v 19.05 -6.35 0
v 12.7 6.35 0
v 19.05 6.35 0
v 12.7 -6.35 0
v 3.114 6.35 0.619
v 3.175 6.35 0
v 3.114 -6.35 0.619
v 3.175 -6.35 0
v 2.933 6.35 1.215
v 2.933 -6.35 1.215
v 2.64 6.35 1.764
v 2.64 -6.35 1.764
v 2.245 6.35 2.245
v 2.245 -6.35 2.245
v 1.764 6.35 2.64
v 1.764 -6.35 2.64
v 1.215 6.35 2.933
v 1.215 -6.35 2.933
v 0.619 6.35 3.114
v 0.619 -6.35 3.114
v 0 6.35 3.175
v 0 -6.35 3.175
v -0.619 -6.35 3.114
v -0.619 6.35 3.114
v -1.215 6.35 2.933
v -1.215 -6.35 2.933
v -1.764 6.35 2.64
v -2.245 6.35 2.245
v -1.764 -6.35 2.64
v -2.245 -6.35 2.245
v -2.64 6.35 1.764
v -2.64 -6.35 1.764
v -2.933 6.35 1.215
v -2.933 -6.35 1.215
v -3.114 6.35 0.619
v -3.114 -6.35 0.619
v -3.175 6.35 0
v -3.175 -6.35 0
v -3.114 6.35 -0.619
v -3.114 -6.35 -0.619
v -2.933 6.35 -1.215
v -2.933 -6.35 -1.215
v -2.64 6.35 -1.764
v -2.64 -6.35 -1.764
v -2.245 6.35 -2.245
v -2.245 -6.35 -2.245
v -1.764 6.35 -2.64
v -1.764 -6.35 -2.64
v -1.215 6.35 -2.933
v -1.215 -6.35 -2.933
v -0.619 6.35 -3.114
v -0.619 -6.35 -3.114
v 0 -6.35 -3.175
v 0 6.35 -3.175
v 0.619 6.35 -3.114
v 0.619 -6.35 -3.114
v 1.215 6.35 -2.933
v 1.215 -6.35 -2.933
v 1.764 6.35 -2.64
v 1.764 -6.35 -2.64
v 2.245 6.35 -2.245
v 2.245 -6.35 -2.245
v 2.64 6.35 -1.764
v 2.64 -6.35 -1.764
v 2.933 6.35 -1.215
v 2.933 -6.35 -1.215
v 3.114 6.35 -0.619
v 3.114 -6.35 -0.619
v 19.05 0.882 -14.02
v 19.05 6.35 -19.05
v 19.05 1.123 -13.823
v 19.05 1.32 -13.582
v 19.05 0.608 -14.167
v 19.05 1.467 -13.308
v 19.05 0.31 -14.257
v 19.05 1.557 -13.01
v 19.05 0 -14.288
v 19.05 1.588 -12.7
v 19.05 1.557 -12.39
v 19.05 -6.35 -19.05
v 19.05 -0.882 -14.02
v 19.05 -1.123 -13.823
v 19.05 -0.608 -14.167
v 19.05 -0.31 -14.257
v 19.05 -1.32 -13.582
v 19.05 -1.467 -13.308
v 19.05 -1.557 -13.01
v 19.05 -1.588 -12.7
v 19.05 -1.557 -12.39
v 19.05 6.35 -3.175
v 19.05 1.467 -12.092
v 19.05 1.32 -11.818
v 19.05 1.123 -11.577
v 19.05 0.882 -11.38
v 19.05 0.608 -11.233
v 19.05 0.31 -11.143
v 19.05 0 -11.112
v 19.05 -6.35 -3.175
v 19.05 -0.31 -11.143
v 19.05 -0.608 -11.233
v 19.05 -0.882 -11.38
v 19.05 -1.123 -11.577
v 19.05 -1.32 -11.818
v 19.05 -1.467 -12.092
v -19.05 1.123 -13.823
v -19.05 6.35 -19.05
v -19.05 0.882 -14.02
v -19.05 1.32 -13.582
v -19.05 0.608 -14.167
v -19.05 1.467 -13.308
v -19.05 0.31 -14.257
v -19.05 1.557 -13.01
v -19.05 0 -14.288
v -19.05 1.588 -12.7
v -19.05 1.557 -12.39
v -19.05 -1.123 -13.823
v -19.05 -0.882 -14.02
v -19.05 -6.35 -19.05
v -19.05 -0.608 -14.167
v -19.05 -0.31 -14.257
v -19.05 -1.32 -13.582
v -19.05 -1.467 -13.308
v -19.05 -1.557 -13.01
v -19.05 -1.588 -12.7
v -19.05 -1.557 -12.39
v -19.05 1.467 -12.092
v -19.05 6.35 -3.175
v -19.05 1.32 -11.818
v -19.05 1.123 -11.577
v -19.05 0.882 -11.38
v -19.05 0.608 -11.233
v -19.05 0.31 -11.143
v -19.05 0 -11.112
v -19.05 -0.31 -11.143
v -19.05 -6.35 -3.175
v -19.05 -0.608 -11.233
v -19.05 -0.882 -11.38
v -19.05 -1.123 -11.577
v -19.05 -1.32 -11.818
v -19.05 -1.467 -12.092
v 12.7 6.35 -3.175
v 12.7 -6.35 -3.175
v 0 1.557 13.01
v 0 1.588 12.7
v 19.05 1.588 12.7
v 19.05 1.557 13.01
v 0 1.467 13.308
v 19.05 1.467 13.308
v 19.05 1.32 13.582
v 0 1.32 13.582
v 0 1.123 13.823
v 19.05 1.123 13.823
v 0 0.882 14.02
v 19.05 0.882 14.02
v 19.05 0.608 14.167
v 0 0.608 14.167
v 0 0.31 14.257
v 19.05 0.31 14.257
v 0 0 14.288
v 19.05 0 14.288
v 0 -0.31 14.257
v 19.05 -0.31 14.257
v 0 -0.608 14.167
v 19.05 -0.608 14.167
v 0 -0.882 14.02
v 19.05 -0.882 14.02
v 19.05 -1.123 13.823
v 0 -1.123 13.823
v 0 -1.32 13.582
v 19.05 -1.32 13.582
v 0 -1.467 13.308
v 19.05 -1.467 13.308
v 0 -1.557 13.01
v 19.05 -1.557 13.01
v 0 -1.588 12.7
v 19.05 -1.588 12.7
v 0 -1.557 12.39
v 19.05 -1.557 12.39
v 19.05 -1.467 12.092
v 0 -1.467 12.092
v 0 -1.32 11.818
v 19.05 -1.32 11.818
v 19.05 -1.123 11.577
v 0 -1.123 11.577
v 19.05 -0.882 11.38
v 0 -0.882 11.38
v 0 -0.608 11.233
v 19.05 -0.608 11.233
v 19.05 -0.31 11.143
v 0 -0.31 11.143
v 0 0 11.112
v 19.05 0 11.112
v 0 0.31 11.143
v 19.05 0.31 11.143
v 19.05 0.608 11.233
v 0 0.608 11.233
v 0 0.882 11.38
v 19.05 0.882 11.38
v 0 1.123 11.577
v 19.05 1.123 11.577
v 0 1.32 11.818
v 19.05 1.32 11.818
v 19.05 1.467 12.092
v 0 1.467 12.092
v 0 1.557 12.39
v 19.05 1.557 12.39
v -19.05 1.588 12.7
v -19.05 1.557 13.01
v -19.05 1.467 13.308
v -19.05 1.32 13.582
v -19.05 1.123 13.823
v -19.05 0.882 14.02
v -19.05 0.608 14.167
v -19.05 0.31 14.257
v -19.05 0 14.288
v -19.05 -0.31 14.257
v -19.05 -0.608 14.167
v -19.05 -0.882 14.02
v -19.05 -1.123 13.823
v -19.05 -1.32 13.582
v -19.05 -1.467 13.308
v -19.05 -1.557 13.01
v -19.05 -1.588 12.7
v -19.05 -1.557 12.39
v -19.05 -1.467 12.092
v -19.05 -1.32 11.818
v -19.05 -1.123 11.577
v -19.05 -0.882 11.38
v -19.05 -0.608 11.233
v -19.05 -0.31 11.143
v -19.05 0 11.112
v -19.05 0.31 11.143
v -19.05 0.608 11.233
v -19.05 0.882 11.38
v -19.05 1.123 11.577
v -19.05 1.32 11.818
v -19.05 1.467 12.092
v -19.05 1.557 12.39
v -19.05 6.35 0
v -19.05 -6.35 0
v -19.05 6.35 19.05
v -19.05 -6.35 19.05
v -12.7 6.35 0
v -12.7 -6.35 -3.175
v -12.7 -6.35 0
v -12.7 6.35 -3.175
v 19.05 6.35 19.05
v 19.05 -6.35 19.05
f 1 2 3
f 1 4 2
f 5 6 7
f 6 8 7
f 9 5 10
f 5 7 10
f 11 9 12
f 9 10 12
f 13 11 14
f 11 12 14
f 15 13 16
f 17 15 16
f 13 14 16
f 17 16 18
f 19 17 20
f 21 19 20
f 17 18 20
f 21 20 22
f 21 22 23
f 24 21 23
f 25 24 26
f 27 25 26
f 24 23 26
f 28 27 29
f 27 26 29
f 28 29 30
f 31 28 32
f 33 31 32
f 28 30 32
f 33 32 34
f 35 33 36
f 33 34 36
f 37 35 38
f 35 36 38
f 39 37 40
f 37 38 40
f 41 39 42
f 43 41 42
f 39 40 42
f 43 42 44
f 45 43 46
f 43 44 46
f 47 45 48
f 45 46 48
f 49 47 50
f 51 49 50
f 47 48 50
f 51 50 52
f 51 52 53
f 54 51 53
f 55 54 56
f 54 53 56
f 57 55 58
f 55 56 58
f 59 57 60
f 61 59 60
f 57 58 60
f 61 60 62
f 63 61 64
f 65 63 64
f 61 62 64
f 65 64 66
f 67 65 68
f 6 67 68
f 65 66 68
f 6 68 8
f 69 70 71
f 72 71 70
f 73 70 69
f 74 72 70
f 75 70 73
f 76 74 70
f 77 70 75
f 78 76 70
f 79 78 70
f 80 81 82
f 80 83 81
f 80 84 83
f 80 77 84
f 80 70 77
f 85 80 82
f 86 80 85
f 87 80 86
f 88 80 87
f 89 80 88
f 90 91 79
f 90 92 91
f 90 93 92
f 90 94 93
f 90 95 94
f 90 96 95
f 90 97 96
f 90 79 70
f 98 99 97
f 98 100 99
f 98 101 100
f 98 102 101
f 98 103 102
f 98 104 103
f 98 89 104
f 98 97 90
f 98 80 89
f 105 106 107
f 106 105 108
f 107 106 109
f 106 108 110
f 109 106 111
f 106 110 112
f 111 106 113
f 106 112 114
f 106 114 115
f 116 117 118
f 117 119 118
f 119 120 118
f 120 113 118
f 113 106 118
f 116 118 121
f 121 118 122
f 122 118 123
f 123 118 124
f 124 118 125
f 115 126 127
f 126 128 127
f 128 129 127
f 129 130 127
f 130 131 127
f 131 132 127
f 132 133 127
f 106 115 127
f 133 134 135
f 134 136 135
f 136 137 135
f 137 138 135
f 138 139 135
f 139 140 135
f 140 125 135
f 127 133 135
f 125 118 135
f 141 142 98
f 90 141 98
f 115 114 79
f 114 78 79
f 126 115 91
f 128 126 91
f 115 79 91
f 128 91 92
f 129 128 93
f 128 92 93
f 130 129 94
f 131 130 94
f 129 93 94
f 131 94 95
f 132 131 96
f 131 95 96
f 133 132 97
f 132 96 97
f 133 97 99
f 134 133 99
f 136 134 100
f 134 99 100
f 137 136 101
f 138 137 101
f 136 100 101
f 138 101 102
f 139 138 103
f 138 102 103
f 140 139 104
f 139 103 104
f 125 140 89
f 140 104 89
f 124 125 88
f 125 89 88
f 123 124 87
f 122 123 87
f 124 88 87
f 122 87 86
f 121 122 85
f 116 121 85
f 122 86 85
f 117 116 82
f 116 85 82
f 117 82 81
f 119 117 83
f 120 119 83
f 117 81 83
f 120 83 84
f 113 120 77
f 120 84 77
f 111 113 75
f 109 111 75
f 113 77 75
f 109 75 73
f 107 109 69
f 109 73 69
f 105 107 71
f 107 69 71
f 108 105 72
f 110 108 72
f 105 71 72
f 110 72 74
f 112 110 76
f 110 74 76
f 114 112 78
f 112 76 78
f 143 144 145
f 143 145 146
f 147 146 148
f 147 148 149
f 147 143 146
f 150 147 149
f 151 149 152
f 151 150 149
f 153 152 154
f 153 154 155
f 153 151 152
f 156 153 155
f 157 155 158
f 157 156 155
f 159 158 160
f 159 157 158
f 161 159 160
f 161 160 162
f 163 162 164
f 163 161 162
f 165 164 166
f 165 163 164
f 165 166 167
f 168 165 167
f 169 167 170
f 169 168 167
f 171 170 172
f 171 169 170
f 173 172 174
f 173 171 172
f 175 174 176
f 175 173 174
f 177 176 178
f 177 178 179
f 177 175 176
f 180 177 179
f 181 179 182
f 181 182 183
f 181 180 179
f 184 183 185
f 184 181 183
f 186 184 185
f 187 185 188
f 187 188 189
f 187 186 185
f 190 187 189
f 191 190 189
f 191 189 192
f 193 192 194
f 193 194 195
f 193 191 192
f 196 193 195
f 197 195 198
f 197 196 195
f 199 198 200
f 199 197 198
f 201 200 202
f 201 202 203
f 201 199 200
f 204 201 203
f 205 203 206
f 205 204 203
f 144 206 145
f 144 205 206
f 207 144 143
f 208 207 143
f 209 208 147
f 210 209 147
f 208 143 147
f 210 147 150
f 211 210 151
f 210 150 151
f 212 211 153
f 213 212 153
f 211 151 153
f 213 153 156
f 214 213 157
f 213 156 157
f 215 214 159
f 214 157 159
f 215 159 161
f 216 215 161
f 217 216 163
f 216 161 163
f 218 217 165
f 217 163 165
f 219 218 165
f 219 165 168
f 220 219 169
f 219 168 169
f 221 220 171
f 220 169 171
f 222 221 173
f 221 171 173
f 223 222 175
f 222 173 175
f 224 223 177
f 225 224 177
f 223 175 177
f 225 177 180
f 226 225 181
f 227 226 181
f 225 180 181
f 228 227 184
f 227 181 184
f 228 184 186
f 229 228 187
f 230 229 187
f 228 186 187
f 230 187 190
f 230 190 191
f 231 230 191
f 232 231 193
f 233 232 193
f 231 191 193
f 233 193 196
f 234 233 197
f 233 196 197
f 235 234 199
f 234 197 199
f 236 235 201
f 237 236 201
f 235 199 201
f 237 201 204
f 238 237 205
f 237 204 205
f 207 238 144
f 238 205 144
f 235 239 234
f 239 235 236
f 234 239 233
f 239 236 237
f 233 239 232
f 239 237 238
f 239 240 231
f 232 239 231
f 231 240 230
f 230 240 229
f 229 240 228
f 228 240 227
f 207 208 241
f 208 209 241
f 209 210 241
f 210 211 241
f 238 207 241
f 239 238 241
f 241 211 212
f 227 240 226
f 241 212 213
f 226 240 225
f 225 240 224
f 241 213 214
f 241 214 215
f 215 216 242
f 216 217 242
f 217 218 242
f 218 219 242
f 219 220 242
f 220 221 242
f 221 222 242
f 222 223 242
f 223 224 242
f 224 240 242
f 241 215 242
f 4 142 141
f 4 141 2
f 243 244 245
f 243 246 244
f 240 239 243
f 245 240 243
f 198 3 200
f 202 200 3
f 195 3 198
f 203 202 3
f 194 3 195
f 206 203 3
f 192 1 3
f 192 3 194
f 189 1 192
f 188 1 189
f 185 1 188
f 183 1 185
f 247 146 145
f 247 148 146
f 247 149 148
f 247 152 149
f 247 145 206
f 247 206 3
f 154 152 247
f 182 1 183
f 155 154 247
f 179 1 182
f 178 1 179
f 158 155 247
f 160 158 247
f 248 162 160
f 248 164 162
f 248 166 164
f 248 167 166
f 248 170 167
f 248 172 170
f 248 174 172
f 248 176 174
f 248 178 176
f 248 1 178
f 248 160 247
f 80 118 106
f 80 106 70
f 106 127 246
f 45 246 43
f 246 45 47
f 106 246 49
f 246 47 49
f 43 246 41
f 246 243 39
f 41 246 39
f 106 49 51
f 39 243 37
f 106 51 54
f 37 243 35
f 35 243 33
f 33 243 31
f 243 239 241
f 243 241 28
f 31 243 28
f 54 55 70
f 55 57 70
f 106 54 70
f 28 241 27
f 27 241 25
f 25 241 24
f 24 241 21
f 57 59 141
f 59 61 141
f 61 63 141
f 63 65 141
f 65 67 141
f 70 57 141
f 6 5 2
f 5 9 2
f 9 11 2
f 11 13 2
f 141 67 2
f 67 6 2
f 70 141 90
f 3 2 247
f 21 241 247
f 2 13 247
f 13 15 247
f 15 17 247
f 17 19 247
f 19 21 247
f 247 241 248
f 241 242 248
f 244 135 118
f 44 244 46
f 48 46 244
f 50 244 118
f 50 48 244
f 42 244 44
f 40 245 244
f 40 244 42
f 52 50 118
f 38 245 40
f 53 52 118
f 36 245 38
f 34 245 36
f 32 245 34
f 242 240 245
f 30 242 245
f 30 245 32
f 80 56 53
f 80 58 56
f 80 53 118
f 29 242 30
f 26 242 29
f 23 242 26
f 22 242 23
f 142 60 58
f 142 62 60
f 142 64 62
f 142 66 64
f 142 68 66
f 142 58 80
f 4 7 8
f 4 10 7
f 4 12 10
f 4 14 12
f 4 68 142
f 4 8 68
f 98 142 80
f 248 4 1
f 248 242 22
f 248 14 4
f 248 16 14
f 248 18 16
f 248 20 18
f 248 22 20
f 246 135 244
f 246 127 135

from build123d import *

# Parameters (mm, degrees)
F0_W     = 38.1
F0_H     = 38.1
F6_DEPTH = 6.35
F1_R     = 3.175
F7_DEPTH = 6.35
F2_W     = 6.35
F2_H     = 3.175
F3_W     = 6.35
F3_H     = 3.175
F8_DEPTH = 6.35
F4_R     = 1.5875
F5_R     = 1.5875
F9_DEPTH = 19.05


with BuildPart() as f6:
    # F0 (on Front) → F6 (new body, symmetric)
    with BuildSketch(Plane.XZ):
        Rectangle(F0_W, F0_H)
    extrude(amount=F6_DEPTH, both=True)

    # F1 (on Front) → F7 (cut, symmetric)
    with BuildSketch(Plane.XZ):
        Circle(F1_R)
    extrude(amount=F7_DEPTH, both=True, mode=Mode.SUBTRACT)

    # F2 (on Front) + F3 (on Front) → F8 (cut, symmetric)
    with BuildSketch(Plane.XZ):
        with Locations((-15.875, -1.5875)):
            Rectangle(F2_W, F2_H)
    with BuildSketch(Plane.XZ):
        with Locations((15.875, -1.5875)):
            Rectangle(F3_W, F3_H)
    extrude(amount=F8_DEPTH, both=True, mode=Mode.SUBTRACT)

    # F4 (on Right) + F5 (on Right) → F9 (cut, symmetric)
    with BuildSketch(Plane.YZ):
        with Locations((0, 12.7)):
            Circle(F4_R)
    with BuildSketch(Plane.YZ):
        with Locations((0, -12.7)):
            Circle(F5_R)
    extrude(amount=F9_DEPTH, both=True, mode=Mode.SUBTRACT)


solid = f6.part
